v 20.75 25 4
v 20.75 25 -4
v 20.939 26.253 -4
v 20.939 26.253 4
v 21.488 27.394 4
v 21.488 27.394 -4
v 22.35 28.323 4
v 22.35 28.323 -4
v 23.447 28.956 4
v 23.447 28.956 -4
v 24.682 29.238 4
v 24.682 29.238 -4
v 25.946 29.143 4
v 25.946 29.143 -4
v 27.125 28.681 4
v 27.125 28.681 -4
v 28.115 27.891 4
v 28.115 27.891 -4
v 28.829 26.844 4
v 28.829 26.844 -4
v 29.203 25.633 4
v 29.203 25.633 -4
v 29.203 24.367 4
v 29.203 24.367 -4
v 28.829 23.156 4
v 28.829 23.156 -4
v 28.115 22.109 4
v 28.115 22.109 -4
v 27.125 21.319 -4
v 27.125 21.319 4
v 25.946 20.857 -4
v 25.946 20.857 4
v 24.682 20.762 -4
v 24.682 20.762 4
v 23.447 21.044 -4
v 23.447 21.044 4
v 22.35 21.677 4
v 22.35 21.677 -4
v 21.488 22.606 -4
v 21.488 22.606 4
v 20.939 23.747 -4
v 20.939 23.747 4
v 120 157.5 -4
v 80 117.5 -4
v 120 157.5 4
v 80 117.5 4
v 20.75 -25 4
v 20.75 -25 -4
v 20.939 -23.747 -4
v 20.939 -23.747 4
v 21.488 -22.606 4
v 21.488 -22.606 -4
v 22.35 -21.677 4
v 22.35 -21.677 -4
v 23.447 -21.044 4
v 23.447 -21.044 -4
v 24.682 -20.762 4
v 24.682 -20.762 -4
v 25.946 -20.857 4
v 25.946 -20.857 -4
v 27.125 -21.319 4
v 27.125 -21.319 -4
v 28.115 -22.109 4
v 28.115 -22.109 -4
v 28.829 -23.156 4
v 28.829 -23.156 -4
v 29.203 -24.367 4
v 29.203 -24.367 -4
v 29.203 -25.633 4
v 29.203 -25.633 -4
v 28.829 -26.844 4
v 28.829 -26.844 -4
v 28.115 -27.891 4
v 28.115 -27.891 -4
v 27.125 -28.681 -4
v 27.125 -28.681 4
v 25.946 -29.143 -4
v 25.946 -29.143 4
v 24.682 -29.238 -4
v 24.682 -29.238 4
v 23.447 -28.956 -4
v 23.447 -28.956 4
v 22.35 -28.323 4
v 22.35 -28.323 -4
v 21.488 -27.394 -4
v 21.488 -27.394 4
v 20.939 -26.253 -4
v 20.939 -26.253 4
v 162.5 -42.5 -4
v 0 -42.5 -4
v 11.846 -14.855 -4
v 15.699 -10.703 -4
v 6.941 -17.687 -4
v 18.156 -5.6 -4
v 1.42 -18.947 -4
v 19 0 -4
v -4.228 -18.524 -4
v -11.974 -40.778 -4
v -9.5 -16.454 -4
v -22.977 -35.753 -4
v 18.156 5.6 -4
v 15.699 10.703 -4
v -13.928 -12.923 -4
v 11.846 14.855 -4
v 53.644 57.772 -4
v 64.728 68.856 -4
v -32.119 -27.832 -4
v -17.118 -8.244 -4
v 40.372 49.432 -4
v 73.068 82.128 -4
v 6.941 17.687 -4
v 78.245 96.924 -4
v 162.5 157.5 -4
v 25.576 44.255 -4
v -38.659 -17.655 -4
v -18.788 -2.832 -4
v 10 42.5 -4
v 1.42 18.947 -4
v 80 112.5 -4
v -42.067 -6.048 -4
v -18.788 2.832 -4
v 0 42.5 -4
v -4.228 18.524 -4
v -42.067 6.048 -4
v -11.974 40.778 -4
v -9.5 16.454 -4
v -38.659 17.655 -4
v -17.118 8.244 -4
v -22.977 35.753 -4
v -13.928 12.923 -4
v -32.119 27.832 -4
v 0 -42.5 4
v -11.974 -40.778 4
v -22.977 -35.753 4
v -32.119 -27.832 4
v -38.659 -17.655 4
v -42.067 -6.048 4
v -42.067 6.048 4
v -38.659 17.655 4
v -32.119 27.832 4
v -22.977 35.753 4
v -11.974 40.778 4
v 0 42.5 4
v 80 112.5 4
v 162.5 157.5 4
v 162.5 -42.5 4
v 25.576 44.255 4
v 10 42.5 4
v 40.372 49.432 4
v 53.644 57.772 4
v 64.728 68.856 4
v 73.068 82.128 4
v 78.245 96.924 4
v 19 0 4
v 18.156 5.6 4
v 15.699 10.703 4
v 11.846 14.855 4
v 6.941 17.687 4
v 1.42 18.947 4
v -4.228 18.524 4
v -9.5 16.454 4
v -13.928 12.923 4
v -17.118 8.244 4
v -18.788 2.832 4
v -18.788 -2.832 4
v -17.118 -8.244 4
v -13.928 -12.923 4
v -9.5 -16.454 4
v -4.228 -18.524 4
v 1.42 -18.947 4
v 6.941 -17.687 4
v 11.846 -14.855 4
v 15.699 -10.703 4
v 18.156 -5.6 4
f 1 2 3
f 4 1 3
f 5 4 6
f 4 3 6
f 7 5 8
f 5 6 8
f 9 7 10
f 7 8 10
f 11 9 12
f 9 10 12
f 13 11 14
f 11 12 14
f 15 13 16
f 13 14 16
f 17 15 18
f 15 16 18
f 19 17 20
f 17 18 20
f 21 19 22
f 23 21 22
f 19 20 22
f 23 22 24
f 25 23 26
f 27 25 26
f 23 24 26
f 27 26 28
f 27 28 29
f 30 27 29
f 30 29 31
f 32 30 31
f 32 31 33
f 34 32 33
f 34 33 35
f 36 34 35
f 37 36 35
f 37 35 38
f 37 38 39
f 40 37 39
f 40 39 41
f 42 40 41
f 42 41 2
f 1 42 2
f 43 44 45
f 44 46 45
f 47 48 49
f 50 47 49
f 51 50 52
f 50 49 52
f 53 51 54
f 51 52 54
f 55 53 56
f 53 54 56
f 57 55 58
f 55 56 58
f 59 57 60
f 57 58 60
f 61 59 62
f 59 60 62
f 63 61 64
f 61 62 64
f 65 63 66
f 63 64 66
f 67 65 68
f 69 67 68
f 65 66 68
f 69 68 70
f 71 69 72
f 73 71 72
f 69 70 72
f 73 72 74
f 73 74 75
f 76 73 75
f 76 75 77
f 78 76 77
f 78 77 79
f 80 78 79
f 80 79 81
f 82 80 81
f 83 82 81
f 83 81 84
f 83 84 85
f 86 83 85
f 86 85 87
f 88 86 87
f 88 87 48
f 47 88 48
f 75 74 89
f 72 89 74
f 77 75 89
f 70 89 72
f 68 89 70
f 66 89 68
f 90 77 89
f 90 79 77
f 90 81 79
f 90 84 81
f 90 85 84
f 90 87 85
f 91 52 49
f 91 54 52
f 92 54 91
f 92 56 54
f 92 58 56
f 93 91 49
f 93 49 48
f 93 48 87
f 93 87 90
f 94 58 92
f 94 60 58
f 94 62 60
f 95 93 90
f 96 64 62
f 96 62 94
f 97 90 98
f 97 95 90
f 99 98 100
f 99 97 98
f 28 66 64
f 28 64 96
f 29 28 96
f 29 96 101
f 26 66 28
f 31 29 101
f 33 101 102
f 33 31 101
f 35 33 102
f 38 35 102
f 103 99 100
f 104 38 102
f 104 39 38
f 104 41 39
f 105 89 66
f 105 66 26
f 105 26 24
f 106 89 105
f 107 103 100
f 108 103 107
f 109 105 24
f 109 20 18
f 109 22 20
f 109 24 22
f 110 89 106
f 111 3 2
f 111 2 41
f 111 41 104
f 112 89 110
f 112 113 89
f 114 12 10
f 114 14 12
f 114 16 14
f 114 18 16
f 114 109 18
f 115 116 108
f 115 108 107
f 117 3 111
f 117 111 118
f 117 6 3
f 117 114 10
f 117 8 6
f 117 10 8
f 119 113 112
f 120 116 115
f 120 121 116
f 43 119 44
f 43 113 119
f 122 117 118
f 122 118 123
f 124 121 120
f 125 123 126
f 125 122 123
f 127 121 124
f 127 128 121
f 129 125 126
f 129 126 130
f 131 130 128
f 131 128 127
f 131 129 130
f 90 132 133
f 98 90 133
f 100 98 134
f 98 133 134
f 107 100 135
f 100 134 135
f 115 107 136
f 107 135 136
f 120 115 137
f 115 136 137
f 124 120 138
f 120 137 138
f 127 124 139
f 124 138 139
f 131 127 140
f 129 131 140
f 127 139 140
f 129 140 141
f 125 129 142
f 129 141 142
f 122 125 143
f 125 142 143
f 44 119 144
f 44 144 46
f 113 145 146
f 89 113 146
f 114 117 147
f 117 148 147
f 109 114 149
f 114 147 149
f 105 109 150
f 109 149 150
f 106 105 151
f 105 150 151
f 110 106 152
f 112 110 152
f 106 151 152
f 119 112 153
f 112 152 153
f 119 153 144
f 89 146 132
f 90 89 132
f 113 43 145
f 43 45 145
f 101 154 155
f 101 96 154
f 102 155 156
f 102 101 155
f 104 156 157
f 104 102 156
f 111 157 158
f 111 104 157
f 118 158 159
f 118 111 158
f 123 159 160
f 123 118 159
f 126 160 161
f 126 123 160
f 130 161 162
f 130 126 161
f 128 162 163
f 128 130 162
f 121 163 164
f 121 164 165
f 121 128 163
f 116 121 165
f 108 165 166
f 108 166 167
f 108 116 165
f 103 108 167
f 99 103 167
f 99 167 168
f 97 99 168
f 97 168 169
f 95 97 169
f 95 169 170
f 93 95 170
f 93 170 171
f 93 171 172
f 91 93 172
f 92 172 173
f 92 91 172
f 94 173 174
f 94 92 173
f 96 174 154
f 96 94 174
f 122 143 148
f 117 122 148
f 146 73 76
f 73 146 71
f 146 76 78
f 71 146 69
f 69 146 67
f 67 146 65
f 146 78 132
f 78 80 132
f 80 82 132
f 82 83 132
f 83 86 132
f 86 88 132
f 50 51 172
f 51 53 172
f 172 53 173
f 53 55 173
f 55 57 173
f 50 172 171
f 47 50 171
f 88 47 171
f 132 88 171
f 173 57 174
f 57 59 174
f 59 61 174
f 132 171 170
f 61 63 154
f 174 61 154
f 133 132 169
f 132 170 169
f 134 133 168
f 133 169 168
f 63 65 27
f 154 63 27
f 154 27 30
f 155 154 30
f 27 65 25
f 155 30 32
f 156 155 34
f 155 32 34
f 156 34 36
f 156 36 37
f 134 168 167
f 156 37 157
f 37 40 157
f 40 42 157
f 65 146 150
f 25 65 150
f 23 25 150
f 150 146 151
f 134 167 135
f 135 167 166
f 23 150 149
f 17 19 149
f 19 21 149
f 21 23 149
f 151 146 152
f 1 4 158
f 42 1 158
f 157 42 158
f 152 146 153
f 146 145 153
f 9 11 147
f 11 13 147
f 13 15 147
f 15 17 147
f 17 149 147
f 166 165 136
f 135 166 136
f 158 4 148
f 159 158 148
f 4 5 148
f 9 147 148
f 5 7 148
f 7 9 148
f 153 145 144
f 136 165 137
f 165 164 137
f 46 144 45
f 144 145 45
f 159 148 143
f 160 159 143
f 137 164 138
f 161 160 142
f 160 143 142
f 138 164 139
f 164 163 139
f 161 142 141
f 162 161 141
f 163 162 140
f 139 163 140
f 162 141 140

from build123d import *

# Parameters (mm, degrees)
SKIZZE1_R                       = 19
AUFSATZ_LINEAR_AUSTRAGEN1_DEPTH = 4
M10_GEWINDEBOHRUNG1_D           = 8.5


with BuildPart() as part:
    # Skizze1 → Aufsatz-Linear austragen1 (new, symmetric)
    with BuildSketch(Plane.XY):
        with BuildLine():
            Line((0, 42.5), (10, 42.5))
            ThreePointArc((10, 42.5), (59.497474683, 63.002525317), (80, 112.5))
            Line((80, 112.5), (80, 117.5))
            Line((80, 117.5), (120, 157.5))
            Line((120, 157.5), (162.5, 157.5))
            Line((162.5, 157.5), (162.5, -42.5))
            Line((162.5, -42.5), (0, -42.5))
            ThreePointArc((0, -42.5), (-42.5, 0), (0, 42.5))
        make_face()
        Circle(SKIZZE1_R, mode=Mode.SUBTRACT)
    extrude(amount=AUFSATZ_LINEAR_AUSTRAGEN1_DEPTH, both=True)

    # M10 Gewindebohrung1 (through all)
    with Locations(Plane.XY.offset(4)):
        with Locations((25, -25), (25, 25)):
            Hole(M10_GEWINDEBOHRUNG1_D / 2)


solid = part.part
